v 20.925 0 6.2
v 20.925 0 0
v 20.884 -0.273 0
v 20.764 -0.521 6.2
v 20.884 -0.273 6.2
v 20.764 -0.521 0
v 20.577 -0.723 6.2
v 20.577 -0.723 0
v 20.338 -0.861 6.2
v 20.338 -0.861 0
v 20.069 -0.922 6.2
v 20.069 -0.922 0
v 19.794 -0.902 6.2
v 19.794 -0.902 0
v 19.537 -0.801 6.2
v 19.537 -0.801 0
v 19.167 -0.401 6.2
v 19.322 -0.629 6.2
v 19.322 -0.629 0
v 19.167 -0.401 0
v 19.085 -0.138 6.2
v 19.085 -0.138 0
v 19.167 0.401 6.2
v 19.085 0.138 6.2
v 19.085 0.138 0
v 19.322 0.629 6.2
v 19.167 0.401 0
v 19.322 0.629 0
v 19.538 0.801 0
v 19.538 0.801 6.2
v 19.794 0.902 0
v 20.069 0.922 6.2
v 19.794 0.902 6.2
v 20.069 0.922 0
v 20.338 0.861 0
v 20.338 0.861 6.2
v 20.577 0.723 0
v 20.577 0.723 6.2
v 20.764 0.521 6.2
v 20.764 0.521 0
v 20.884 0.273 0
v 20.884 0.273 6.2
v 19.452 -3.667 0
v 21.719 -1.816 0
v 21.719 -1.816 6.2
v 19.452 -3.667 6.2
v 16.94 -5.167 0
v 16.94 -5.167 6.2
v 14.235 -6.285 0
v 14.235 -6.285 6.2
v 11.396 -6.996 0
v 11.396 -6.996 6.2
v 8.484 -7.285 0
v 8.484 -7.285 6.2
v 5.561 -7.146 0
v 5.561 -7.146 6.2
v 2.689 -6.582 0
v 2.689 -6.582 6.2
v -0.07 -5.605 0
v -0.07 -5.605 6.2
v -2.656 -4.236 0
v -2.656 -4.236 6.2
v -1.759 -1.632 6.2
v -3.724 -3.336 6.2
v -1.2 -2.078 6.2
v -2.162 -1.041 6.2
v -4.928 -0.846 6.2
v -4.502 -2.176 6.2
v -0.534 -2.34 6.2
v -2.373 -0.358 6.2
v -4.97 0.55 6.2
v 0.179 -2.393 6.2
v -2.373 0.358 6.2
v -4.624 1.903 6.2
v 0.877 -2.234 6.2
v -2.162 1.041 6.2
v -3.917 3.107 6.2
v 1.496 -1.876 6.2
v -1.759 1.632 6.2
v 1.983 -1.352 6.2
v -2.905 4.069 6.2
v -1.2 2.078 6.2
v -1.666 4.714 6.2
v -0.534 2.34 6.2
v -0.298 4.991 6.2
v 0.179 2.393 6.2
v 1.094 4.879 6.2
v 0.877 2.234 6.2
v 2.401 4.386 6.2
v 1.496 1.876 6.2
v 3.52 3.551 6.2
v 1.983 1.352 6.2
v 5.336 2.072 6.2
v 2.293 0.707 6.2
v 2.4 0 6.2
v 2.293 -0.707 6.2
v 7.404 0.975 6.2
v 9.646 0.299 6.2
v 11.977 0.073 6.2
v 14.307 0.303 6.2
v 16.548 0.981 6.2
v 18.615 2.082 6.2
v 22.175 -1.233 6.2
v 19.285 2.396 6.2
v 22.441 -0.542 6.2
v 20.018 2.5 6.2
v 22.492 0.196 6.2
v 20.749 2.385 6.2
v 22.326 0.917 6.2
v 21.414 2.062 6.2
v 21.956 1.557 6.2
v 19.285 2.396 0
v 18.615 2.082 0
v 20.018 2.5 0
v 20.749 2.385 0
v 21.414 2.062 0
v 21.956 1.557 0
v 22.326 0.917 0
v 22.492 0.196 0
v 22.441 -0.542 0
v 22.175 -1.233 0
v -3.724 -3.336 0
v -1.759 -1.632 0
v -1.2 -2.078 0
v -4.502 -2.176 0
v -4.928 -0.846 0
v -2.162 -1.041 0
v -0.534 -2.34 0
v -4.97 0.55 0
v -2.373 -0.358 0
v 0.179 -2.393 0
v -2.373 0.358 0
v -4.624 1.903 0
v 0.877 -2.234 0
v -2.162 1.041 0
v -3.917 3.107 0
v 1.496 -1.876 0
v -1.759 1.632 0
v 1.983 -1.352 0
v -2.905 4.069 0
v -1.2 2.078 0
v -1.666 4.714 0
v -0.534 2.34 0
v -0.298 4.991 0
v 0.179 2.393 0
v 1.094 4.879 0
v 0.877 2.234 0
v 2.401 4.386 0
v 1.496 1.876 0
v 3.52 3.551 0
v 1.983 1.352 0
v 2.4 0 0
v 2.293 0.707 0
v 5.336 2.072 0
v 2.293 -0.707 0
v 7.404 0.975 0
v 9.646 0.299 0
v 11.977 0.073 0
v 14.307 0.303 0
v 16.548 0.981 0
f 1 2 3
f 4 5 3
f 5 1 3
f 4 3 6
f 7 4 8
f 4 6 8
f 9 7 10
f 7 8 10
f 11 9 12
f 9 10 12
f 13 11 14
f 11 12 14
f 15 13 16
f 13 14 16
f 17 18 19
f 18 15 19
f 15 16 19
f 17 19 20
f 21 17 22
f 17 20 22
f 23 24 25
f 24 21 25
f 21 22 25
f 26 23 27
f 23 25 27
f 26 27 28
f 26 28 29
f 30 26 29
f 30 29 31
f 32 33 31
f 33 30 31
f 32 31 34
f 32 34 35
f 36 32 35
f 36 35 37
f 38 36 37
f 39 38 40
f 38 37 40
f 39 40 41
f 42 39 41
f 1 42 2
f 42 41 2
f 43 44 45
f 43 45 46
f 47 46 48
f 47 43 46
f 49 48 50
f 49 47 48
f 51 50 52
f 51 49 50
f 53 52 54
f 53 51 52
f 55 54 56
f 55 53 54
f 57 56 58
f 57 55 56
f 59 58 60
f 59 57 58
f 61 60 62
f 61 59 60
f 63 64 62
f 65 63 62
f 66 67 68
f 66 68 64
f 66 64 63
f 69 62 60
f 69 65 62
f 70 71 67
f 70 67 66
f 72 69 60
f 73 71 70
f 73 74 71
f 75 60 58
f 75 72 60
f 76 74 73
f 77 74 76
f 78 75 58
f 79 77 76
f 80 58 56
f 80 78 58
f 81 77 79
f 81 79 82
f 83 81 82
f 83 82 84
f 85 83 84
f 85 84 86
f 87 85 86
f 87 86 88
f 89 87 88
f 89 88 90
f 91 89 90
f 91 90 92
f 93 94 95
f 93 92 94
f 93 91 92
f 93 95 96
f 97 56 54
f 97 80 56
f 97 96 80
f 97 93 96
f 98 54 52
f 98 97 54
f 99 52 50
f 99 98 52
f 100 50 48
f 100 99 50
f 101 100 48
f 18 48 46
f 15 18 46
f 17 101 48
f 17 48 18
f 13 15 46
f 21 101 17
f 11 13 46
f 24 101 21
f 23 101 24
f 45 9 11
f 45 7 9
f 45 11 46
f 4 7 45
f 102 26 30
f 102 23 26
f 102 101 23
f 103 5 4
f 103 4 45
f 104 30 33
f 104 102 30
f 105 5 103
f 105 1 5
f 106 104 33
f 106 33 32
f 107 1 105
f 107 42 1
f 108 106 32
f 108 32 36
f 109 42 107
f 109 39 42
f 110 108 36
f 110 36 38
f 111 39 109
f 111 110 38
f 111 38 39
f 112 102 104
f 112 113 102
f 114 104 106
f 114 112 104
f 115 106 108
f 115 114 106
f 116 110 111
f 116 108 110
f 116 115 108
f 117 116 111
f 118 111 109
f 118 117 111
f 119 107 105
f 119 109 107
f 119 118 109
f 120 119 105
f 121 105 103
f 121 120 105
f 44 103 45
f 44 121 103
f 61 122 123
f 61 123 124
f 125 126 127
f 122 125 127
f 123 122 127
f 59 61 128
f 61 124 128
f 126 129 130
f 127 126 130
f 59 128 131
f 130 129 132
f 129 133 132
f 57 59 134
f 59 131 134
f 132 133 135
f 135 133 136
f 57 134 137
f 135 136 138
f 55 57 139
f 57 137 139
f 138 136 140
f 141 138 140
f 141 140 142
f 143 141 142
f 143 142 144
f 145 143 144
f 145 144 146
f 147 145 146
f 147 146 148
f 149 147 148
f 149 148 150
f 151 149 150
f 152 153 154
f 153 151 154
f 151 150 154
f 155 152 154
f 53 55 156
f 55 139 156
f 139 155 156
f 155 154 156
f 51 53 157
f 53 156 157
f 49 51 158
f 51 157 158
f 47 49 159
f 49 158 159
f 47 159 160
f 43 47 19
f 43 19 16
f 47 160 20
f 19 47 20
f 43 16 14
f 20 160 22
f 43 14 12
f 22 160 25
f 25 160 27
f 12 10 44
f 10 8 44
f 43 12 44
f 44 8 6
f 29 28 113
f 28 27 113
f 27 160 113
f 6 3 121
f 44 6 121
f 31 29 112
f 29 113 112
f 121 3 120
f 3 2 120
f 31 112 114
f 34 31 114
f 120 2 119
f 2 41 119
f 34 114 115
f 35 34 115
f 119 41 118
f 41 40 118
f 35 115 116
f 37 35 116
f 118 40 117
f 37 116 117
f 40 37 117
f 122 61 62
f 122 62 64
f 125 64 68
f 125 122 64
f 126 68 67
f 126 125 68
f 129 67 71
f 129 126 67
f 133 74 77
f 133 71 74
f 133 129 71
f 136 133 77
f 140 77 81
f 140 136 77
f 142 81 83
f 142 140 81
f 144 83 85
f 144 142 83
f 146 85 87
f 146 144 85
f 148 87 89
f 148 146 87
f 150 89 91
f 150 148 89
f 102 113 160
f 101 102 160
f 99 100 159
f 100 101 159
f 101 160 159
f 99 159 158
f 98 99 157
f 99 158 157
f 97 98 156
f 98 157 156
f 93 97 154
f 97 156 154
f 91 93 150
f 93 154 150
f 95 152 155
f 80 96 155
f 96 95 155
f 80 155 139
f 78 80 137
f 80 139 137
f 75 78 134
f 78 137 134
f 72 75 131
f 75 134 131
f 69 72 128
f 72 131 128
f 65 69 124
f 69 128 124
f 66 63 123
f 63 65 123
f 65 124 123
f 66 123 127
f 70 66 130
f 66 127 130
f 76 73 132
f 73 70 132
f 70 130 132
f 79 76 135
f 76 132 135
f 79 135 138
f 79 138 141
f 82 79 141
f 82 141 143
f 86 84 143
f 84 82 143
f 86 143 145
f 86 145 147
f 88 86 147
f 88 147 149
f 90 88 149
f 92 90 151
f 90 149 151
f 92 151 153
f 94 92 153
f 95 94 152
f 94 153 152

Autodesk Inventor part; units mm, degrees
ref_plane "YZ Plane" through (0, 0, 0) normal (1, 0, 0) x (0, 1, 0)
ref_plane "XZ Plane" through (0, 0, 0) normal (0, 1, 0) x (-1, 0, 0)
ref_plane "XY Plane" through (0, 0, 0) normal (0, 0, 1) x (1, 0, 0)
sketch "Sketch1" plane through (0, 0, 0) normal (0, 0, 1) x (1, 0, 0)
  circle A0 centre (0, 0) radius 2.4
  arc A1 (21.7188, -1.8155) -> (18.6153, 2.0815) centre (20, 0) ccw
  arc A2 (3.5202, 3.5508) -> (-2.6562, -4.2361) centre (0, 0) ccw
  circle A3 centre (20, 0) radius 0.925
  arc A4 (-2.6562, -4.2361) -> (21.7188, -1.8155) centre (7.9688, 12.7082) ccw
  arc A5 (3.5202, 3.5508) -> (18.6153, 2.0815) centre (11.9688, 12.0727) ccw
  dimension "d0" = 4.8
  dimension "d3" = 2.5
  dimension "d6" = 5
  dimension "d7" = 20
  dimension "d8" = 1.85
  dimension "d9" = 20
  dimension "d10" = 12
extrude "Extrusion1" add sketch "Sketch1" along normal blind 6.2
properties part number "slider_link_p4"
